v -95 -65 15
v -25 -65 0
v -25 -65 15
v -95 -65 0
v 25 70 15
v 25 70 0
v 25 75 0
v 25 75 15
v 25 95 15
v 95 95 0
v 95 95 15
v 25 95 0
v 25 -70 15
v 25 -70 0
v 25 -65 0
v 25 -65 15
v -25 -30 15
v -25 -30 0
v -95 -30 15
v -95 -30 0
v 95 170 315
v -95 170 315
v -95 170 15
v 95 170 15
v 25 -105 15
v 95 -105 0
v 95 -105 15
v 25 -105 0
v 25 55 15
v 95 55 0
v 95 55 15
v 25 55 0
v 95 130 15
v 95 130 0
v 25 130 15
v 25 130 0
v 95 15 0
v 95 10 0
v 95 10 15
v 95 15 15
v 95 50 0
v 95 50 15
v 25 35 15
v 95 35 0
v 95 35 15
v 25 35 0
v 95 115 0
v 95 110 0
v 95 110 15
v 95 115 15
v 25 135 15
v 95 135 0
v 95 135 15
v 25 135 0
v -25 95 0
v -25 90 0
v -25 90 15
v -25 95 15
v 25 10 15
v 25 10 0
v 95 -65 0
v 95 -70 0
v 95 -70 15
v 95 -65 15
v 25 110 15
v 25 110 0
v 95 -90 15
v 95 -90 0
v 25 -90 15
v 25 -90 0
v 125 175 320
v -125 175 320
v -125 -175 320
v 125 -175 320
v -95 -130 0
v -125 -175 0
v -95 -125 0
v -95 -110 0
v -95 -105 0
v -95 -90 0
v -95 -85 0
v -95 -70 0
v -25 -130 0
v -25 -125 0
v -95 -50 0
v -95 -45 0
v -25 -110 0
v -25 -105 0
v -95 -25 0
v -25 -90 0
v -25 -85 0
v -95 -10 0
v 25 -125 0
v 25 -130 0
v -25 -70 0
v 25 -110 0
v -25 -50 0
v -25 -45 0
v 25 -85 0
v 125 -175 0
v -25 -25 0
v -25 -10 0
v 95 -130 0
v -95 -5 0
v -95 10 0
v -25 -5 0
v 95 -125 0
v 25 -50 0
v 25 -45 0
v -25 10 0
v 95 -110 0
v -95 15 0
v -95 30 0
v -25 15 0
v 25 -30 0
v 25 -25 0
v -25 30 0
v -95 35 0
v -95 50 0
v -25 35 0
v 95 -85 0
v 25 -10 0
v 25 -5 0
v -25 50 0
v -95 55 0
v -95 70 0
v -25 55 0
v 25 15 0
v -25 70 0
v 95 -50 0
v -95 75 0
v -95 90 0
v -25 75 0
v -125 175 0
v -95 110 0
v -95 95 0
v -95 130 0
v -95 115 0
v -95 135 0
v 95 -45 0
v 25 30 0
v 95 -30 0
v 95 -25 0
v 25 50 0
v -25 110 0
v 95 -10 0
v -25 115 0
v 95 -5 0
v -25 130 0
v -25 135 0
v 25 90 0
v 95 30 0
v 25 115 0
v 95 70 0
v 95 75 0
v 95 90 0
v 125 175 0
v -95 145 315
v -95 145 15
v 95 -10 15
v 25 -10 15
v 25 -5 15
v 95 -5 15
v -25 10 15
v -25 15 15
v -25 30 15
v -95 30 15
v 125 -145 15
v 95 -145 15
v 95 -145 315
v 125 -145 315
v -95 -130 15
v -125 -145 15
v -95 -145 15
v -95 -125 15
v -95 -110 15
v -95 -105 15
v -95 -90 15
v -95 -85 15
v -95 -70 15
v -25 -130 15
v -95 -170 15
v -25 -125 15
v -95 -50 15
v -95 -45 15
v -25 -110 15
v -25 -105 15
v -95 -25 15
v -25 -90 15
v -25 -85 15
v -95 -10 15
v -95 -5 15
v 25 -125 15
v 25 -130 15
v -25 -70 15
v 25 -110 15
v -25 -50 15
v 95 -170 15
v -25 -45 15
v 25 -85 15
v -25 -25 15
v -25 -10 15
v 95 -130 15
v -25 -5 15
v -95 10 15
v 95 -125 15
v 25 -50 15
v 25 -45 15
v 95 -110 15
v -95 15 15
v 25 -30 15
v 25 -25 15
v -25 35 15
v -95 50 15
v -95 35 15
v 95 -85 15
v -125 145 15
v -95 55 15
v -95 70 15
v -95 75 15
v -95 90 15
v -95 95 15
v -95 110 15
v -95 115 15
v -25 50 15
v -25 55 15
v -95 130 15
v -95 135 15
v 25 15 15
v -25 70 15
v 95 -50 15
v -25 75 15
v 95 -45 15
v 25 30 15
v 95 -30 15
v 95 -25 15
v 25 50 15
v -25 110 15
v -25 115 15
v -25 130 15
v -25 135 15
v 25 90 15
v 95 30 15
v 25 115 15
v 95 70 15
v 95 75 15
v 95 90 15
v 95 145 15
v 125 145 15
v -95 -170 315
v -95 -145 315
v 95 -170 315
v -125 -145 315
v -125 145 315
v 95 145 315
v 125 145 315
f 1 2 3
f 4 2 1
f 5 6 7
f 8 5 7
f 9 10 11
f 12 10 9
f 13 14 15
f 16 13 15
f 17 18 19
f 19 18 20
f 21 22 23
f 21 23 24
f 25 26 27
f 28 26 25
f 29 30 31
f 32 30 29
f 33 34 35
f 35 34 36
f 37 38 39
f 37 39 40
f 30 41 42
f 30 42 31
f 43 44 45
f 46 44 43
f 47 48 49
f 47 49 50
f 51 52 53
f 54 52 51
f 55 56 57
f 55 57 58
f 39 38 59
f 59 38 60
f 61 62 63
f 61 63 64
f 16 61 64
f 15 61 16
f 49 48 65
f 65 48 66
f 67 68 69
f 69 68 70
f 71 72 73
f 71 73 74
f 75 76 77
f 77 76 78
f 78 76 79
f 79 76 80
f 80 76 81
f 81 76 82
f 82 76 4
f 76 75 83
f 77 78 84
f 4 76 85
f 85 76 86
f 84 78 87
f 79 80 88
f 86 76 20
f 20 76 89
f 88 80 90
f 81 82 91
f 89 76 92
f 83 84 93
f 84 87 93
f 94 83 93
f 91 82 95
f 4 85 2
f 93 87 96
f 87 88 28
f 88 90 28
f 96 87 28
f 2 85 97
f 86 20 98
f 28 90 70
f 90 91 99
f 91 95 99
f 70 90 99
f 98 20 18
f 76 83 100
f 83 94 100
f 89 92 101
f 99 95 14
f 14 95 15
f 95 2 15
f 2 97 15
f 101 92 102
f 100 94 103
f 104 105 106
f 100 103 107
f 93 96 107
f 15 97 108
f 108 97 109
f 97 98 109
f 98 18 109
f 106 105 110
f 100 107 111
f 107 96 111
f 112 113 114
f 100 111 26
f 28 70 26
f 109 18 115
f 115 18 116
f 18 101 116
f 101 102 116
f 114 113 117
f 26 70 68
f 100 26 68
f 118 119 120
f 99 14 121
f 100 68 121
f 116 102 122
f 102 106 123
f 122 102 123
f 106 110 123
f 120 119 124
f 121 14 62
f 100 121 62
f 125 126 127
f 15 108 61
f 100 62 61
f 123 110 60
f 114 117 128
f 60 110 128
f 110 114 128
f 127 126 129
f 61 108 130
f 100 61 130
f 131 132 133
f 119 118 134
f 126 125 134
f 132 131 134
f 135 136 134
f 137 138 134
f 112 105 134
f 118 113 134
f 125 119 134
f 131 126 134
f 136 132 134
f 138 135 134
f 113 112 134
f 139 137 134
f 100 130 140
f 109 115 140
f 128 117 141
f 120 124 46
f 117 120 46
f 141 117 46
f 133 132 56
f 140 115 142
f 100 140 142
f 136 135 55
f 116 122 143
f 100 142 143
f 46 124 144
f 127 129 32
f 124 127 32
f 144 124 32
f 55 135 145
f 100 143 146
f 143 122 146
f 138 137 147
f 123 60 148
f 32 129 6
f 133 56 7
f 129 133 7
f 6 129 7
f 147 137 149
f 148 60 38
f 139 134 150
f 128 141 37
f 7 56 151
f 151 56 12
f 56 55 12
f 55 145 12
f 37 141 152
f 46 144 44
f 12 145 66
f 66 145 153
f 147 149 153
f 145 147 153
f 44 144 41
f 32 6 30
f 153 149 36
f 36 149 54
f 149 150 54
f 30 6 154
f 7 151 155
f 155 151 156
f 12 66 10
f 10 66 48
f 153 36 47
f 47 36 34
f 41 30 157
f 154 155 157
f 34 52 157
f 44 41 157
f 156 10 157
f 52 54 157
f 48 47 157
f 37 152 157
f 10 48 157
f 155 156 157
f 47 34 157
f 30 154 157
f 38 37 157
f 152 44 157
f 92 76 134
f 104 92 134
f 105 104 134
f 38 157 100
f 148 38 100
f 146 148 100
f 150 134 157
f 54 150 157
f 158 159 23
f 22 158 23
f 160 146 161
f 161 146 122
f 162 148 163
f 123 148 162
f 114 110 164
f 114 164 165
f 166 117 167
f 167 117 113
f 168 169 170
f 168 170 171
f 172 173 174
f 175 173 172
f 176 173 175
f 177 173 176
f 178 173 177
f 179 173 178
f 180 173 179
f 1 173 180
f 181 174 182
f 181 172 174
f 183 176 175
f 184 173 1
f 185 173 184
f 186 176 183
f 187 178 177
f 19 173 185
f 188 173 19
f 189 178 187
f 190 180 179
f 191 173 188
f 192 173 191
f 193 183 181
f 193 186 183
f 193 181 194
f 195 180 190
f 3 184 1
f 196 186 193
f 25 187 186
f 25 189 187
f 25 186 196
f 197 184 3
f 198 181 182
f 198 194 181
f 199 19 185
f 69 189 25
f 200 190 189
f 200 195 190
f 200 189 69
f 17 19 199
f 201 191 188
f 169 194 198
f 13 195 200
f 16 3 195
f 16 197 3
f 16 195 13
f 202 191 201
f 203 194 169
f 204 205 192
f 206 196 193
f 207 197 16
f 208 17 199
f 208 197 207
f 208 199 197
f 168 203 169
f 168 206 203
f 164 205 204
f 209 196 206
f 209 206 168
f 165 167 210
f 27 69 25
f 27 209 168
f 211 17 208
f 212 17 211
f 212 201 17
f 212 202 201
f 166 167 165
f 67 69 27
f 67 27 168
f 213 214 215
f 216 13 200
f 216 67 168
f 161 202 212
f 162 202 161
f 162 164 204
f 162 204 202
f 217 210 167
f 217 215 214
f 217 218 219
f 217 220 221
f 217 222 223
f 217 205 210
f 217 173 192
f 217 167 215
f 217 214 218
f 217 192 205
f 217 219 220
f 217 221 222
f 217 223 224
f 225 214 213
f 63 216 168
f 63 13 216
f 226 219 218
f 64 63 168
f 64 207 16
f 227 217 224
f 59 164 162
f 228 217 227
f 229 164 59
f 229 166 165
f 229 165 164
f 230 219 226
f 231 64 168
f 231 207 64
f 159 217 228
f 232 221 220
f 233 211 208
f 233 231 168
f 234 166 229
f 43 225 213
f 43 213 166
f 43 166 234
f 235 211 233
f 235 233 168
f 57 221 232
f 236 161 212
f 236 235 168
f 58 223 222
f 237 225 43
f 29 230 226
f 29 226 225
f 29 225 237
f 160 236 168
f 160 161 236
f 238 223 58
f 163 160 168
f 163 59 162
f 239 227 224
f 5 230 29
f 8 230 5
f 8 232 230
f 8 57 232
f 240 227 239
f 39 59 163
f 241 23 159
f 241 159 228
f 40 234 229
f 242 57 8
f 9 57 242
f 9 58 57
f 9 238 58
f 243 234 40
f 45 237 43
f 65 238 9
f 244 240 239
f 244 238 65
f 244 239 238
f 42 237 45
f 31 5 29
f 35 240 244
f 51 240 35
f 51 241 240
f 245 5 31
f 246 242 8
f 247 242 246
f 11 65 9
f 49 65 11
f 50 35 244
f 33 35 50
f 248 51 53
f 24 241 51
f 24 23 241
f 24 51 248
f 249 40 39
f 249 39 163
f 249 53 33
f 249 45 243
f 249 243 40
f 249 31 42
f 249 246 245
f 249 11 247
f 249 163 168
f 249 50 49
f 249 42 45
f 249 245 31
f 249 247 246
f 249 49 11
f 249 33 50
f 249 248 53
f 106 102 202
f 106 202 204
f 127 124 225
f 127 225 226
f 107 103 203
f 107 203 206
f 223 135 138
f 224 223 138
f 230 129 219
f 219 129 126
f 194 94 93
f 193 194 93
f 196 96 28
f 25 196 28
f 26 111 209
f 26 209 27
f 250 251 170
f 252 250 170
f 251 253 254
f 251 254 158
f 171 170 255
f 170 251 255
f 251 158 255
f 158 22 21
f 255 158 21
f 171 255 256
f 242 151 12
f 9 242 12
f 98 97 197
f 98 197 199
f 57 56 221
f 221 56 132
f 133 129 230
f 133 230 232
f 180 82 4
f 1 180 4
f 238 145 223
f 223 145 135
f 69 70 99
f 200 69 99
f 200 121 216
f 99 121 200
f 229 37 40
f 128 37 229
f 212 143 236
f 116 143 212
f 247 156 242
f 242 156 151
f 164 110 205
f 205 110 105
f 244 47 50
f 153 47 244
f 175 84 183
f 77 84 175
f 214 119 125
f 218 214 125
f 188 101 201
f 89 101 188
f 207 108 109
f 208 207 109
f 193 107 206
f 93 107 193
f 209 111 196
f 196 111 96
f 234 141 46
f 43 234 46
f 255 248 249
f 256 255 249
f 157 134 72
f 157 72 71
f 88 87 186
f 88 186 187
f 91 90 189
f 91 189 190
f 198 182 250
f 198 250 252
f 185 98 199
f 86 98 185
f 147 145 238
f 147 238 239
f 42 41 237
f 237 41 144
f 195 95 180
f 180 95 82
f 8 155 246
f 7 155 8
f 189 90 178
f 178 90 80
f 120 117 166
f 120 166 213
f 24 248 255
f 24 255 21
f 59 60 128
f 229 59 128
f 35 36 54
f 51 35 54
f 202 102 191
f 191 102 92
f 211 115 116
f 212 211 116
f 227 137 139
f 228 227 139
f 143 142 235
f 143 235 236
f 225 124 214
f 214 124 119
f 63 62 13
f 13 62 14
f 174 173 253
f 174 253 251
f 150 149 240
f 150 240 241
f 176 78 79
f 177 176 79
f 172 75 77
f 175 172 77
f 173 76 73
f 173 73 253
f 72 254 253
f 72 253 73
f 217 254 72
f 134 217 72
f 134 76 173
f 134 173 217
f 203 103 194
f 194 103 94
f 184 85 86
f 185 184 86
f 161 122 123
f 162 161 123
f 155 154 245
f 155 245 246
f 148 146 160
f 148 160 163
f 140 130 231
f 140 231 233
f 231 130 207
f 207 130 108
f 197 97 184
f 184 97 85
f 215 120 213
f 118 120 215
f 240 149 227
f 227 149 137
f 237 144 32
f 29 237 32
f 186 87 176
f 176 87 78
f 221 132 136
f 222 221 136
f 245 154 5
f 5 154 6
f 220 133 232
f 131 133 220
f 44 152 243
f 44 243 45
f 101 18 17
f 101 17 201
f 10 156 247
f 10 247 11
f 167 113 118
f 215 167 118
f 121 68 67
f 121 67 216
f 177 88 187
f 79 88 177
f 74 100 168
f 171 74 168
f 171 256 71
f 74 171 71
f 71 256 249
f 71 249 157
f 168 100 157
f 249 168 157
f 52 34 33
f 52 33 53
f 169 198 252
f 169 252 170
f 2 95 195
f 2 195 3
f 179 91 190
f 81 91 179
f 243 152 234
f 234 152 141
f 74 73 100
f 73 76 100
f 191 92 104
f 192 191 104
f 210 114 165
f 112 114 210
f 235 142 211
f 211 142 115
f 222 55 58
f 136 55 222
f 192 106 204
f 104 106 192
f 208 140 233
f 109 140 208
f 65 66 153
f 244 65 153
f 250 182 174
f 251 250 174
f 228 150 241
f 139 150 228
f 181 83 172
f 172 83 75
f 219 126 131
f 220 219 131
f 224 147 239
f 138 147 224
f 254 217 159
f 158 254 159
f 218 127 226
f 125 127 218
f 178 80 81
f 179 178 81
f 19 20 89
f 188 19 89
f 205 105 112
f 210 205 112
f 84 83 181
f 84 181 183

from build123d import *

# Parameters (mm, degrees)
CROQUIS1_W              = 250
CROQUIS1_H              = 350
SALIENTE_EXTRUIR2_DEPTH = 15
CROQUIS2_W              = 30
CROQUIS2_H              = 30
SALIENTE_EXTRUIR3_DEPTH = 300
CROQUIS3_W              = 250
CROQUIS3_H              = 350
SALIENTE_EXTRUIR4_DEPTH = 5
CROQUIS7_W              = 70
CROQUIS7_H              = 5
CORTAR_EXTRUIR1_DEPTH   = 20
CROQUIS8_W              = 250
CROQUIS8_H              = 320
SALIENTE_EXTRUIR5_DEPTH = 5
CROQUIS9_W              = 250
CROQUIS9_H              = 320
SALIENTE_EXTRUIR6_DEPTH = 5


with BuildPart() as part:
    # Croquis1 → Saliente-Extruir2 (new body)
    with BuildSketch(Plane.XY):
        Rectangle(CROQUIS1_W, CROQUIS1_H)
    extrude(amount=SALIENTE_EXTRUIR2_DEPTH)

    # Croquis2 → Saliente-Extruir3 (add)
    with BuildSketch(Plane.XY.offset(15)):
        with Locations((-110, 160)):
            Rectangle(CROQUIS2_W, CROQUIS2_H)
        with Locations((110, 160)):
            Rectangle(CROQUIS2_W, CROQUIS2_H)
        with Locations((-110, -160)):
            Rectangle(CROQUIS2_W, CROQUIS2_H)
        with Locations((110, -160)):
            Rectangle(CROQUIS2_W, CROQUIS2_H)
    extrude(amount=SALIENTE_EXTRUIR3_DEPTH)

    # Croquis3 → Saliente-Extruir4 (add)
    with BuildSketch(Plane.XY.offset(315)):
        Rectangle(CROQUIS3_W, CROQUIS3_H)
    extrude(amount=SALIENTE_EXTRUIR4_DEPTH)

    # Croquis7 → Cortar-Extruir1 (cut)
    with BuildSketch(Plane(origin=(0, 0, 0), x_dir=(-1, 0, 0), z_dir=(0, 0, -1))):
        with Locations((60, 132.5)):
            Rectangle(CROQUIS7_W, CROQUIS7_H)
        with Locations((-60, 132.5)):
            Rectangle(CROQUIS7_W, CROQUIS7_H)
        with Locations((60, 112.5)):
            Rectangle(CROQUIS7_W, CROQUIS7_H)
        with Locations((60, 92.5)):
            Rectangle(CROQUIS7_W, CROQUIS7_H)
        with Locations((60, 72.5)):
            Rectangle(CROQUIS7_W, CROQUIS7_H)
        with Locations((60, 52.5)):
            Rectangle(CROQUIS7_W, CROQUIS7_H)
        with Locations((60, 32.5)):
            Rectangle(CROQUIS7_W, CROQUIS7_H)
        with Locations((60, 12.5)):
            Rectangle(CROQUIS7_W, CROQUIS7_H)
        with Locations((60, -7.5)):
            Rectangle(CROQUIS7_W, CROQUIS7_H)
        with Locations((60, -27.5)):
            Rectangle(CROQUIS7_W, CROQUIS7_H)
        with Locations((60, -47.5)):
            Rectangle(CROQUIS7_W, CROQUIS7_H)
        with Locations((-60, 112.5)):
            Rectangle(CROQUIS7_W, CROQUIS7_H)
        with Locations((-60, 92.5)):
            Rectangle(CROQUIS7_W, CROQUIS7_H)
        with Locations((-60, 72.5)):
            Rectangle(CROQUIS7_W, CROQUIS7_H)
        with Locations((-60, 52.5)):
            Rectangle(CROQUIS7_W, CROQUIS7_H)
        with Locations((-60, 32.5)):
            Rectangle(CROQUIS7_W, CROQUIS7_H)
        with Locations((-60, 12.5)):
            Rectangle(CROQUIS7_W, CROQUIS7_H)
        with Locations((-60, -7.5)):
            Rectangle(CROQUIS7_W, CROQUIS7_H)
        with Locations((-60, -27.5)):
            Rectangle(CROQUIS7_W, CROQUIS7_H)
        with Locations((-60, -47.5)):
            Rectangle(CROQUIS7_W, CROQUIS7_H)
        with Locations((-60, -67.5)):
            Rectangle(CROQUIS7_W, CROQUIS7_H)
        with Locations((60, -67.5)):
            Rectangle(CROQUIS7_W, CROQUIS7_H)
        with Locations((-60, -87.5)):
            Rectangle(CROQUIS7_W, CROQUIS7_H)
        with Locations((60, -87.5)):
            Rectangle(CROQUIS7_W, CROQUIS7_H)
        with Locations((-60, -107.5)):
            Rectangle(CROQUIS7_W, CROQUIS7_H)
        with Locations((60, -107.5)):
            Rectangle(CROQUIS7_W, CROQUIS7_H)
        with Locations((-60, -127.5)):
            Rectangle(CROQUIS7_W, CROQUIS7_H)
        with Locations((60, -127.5)):
            Rectangle(CROQUIS7_W, CROQUIS7_H)
    extrude(amount=-CORTAR_EXTRUIR1_DEPTH, mode=Mode.SUBTRACT)

    # Croquis8 → Saliente-Extruir5 (add)
    with BuildSketch(Plane.XZ.offset(175)):
        with Locations((0, 160)):
            Rectangle(CROQUIS8_W, CROQUIS8_H)
    extrude(amount=-SALIENTE_EXTRUIR5_DEPTH)

    # Croquis9 → Saliente-Extruir6 (add)
    with BuildSketch(Plane(origin=(0, 175, 0), x_dir=(1, 0, 0), z_dir=(0, 1, 0))):
        with Locations((0, -160)):
            Rectangle(CROQUIS9_W, CROQUIS9_H)
    extrude(amount=-SALIENTE_EXTRUIR6_DEPTH)


solid = part.part
